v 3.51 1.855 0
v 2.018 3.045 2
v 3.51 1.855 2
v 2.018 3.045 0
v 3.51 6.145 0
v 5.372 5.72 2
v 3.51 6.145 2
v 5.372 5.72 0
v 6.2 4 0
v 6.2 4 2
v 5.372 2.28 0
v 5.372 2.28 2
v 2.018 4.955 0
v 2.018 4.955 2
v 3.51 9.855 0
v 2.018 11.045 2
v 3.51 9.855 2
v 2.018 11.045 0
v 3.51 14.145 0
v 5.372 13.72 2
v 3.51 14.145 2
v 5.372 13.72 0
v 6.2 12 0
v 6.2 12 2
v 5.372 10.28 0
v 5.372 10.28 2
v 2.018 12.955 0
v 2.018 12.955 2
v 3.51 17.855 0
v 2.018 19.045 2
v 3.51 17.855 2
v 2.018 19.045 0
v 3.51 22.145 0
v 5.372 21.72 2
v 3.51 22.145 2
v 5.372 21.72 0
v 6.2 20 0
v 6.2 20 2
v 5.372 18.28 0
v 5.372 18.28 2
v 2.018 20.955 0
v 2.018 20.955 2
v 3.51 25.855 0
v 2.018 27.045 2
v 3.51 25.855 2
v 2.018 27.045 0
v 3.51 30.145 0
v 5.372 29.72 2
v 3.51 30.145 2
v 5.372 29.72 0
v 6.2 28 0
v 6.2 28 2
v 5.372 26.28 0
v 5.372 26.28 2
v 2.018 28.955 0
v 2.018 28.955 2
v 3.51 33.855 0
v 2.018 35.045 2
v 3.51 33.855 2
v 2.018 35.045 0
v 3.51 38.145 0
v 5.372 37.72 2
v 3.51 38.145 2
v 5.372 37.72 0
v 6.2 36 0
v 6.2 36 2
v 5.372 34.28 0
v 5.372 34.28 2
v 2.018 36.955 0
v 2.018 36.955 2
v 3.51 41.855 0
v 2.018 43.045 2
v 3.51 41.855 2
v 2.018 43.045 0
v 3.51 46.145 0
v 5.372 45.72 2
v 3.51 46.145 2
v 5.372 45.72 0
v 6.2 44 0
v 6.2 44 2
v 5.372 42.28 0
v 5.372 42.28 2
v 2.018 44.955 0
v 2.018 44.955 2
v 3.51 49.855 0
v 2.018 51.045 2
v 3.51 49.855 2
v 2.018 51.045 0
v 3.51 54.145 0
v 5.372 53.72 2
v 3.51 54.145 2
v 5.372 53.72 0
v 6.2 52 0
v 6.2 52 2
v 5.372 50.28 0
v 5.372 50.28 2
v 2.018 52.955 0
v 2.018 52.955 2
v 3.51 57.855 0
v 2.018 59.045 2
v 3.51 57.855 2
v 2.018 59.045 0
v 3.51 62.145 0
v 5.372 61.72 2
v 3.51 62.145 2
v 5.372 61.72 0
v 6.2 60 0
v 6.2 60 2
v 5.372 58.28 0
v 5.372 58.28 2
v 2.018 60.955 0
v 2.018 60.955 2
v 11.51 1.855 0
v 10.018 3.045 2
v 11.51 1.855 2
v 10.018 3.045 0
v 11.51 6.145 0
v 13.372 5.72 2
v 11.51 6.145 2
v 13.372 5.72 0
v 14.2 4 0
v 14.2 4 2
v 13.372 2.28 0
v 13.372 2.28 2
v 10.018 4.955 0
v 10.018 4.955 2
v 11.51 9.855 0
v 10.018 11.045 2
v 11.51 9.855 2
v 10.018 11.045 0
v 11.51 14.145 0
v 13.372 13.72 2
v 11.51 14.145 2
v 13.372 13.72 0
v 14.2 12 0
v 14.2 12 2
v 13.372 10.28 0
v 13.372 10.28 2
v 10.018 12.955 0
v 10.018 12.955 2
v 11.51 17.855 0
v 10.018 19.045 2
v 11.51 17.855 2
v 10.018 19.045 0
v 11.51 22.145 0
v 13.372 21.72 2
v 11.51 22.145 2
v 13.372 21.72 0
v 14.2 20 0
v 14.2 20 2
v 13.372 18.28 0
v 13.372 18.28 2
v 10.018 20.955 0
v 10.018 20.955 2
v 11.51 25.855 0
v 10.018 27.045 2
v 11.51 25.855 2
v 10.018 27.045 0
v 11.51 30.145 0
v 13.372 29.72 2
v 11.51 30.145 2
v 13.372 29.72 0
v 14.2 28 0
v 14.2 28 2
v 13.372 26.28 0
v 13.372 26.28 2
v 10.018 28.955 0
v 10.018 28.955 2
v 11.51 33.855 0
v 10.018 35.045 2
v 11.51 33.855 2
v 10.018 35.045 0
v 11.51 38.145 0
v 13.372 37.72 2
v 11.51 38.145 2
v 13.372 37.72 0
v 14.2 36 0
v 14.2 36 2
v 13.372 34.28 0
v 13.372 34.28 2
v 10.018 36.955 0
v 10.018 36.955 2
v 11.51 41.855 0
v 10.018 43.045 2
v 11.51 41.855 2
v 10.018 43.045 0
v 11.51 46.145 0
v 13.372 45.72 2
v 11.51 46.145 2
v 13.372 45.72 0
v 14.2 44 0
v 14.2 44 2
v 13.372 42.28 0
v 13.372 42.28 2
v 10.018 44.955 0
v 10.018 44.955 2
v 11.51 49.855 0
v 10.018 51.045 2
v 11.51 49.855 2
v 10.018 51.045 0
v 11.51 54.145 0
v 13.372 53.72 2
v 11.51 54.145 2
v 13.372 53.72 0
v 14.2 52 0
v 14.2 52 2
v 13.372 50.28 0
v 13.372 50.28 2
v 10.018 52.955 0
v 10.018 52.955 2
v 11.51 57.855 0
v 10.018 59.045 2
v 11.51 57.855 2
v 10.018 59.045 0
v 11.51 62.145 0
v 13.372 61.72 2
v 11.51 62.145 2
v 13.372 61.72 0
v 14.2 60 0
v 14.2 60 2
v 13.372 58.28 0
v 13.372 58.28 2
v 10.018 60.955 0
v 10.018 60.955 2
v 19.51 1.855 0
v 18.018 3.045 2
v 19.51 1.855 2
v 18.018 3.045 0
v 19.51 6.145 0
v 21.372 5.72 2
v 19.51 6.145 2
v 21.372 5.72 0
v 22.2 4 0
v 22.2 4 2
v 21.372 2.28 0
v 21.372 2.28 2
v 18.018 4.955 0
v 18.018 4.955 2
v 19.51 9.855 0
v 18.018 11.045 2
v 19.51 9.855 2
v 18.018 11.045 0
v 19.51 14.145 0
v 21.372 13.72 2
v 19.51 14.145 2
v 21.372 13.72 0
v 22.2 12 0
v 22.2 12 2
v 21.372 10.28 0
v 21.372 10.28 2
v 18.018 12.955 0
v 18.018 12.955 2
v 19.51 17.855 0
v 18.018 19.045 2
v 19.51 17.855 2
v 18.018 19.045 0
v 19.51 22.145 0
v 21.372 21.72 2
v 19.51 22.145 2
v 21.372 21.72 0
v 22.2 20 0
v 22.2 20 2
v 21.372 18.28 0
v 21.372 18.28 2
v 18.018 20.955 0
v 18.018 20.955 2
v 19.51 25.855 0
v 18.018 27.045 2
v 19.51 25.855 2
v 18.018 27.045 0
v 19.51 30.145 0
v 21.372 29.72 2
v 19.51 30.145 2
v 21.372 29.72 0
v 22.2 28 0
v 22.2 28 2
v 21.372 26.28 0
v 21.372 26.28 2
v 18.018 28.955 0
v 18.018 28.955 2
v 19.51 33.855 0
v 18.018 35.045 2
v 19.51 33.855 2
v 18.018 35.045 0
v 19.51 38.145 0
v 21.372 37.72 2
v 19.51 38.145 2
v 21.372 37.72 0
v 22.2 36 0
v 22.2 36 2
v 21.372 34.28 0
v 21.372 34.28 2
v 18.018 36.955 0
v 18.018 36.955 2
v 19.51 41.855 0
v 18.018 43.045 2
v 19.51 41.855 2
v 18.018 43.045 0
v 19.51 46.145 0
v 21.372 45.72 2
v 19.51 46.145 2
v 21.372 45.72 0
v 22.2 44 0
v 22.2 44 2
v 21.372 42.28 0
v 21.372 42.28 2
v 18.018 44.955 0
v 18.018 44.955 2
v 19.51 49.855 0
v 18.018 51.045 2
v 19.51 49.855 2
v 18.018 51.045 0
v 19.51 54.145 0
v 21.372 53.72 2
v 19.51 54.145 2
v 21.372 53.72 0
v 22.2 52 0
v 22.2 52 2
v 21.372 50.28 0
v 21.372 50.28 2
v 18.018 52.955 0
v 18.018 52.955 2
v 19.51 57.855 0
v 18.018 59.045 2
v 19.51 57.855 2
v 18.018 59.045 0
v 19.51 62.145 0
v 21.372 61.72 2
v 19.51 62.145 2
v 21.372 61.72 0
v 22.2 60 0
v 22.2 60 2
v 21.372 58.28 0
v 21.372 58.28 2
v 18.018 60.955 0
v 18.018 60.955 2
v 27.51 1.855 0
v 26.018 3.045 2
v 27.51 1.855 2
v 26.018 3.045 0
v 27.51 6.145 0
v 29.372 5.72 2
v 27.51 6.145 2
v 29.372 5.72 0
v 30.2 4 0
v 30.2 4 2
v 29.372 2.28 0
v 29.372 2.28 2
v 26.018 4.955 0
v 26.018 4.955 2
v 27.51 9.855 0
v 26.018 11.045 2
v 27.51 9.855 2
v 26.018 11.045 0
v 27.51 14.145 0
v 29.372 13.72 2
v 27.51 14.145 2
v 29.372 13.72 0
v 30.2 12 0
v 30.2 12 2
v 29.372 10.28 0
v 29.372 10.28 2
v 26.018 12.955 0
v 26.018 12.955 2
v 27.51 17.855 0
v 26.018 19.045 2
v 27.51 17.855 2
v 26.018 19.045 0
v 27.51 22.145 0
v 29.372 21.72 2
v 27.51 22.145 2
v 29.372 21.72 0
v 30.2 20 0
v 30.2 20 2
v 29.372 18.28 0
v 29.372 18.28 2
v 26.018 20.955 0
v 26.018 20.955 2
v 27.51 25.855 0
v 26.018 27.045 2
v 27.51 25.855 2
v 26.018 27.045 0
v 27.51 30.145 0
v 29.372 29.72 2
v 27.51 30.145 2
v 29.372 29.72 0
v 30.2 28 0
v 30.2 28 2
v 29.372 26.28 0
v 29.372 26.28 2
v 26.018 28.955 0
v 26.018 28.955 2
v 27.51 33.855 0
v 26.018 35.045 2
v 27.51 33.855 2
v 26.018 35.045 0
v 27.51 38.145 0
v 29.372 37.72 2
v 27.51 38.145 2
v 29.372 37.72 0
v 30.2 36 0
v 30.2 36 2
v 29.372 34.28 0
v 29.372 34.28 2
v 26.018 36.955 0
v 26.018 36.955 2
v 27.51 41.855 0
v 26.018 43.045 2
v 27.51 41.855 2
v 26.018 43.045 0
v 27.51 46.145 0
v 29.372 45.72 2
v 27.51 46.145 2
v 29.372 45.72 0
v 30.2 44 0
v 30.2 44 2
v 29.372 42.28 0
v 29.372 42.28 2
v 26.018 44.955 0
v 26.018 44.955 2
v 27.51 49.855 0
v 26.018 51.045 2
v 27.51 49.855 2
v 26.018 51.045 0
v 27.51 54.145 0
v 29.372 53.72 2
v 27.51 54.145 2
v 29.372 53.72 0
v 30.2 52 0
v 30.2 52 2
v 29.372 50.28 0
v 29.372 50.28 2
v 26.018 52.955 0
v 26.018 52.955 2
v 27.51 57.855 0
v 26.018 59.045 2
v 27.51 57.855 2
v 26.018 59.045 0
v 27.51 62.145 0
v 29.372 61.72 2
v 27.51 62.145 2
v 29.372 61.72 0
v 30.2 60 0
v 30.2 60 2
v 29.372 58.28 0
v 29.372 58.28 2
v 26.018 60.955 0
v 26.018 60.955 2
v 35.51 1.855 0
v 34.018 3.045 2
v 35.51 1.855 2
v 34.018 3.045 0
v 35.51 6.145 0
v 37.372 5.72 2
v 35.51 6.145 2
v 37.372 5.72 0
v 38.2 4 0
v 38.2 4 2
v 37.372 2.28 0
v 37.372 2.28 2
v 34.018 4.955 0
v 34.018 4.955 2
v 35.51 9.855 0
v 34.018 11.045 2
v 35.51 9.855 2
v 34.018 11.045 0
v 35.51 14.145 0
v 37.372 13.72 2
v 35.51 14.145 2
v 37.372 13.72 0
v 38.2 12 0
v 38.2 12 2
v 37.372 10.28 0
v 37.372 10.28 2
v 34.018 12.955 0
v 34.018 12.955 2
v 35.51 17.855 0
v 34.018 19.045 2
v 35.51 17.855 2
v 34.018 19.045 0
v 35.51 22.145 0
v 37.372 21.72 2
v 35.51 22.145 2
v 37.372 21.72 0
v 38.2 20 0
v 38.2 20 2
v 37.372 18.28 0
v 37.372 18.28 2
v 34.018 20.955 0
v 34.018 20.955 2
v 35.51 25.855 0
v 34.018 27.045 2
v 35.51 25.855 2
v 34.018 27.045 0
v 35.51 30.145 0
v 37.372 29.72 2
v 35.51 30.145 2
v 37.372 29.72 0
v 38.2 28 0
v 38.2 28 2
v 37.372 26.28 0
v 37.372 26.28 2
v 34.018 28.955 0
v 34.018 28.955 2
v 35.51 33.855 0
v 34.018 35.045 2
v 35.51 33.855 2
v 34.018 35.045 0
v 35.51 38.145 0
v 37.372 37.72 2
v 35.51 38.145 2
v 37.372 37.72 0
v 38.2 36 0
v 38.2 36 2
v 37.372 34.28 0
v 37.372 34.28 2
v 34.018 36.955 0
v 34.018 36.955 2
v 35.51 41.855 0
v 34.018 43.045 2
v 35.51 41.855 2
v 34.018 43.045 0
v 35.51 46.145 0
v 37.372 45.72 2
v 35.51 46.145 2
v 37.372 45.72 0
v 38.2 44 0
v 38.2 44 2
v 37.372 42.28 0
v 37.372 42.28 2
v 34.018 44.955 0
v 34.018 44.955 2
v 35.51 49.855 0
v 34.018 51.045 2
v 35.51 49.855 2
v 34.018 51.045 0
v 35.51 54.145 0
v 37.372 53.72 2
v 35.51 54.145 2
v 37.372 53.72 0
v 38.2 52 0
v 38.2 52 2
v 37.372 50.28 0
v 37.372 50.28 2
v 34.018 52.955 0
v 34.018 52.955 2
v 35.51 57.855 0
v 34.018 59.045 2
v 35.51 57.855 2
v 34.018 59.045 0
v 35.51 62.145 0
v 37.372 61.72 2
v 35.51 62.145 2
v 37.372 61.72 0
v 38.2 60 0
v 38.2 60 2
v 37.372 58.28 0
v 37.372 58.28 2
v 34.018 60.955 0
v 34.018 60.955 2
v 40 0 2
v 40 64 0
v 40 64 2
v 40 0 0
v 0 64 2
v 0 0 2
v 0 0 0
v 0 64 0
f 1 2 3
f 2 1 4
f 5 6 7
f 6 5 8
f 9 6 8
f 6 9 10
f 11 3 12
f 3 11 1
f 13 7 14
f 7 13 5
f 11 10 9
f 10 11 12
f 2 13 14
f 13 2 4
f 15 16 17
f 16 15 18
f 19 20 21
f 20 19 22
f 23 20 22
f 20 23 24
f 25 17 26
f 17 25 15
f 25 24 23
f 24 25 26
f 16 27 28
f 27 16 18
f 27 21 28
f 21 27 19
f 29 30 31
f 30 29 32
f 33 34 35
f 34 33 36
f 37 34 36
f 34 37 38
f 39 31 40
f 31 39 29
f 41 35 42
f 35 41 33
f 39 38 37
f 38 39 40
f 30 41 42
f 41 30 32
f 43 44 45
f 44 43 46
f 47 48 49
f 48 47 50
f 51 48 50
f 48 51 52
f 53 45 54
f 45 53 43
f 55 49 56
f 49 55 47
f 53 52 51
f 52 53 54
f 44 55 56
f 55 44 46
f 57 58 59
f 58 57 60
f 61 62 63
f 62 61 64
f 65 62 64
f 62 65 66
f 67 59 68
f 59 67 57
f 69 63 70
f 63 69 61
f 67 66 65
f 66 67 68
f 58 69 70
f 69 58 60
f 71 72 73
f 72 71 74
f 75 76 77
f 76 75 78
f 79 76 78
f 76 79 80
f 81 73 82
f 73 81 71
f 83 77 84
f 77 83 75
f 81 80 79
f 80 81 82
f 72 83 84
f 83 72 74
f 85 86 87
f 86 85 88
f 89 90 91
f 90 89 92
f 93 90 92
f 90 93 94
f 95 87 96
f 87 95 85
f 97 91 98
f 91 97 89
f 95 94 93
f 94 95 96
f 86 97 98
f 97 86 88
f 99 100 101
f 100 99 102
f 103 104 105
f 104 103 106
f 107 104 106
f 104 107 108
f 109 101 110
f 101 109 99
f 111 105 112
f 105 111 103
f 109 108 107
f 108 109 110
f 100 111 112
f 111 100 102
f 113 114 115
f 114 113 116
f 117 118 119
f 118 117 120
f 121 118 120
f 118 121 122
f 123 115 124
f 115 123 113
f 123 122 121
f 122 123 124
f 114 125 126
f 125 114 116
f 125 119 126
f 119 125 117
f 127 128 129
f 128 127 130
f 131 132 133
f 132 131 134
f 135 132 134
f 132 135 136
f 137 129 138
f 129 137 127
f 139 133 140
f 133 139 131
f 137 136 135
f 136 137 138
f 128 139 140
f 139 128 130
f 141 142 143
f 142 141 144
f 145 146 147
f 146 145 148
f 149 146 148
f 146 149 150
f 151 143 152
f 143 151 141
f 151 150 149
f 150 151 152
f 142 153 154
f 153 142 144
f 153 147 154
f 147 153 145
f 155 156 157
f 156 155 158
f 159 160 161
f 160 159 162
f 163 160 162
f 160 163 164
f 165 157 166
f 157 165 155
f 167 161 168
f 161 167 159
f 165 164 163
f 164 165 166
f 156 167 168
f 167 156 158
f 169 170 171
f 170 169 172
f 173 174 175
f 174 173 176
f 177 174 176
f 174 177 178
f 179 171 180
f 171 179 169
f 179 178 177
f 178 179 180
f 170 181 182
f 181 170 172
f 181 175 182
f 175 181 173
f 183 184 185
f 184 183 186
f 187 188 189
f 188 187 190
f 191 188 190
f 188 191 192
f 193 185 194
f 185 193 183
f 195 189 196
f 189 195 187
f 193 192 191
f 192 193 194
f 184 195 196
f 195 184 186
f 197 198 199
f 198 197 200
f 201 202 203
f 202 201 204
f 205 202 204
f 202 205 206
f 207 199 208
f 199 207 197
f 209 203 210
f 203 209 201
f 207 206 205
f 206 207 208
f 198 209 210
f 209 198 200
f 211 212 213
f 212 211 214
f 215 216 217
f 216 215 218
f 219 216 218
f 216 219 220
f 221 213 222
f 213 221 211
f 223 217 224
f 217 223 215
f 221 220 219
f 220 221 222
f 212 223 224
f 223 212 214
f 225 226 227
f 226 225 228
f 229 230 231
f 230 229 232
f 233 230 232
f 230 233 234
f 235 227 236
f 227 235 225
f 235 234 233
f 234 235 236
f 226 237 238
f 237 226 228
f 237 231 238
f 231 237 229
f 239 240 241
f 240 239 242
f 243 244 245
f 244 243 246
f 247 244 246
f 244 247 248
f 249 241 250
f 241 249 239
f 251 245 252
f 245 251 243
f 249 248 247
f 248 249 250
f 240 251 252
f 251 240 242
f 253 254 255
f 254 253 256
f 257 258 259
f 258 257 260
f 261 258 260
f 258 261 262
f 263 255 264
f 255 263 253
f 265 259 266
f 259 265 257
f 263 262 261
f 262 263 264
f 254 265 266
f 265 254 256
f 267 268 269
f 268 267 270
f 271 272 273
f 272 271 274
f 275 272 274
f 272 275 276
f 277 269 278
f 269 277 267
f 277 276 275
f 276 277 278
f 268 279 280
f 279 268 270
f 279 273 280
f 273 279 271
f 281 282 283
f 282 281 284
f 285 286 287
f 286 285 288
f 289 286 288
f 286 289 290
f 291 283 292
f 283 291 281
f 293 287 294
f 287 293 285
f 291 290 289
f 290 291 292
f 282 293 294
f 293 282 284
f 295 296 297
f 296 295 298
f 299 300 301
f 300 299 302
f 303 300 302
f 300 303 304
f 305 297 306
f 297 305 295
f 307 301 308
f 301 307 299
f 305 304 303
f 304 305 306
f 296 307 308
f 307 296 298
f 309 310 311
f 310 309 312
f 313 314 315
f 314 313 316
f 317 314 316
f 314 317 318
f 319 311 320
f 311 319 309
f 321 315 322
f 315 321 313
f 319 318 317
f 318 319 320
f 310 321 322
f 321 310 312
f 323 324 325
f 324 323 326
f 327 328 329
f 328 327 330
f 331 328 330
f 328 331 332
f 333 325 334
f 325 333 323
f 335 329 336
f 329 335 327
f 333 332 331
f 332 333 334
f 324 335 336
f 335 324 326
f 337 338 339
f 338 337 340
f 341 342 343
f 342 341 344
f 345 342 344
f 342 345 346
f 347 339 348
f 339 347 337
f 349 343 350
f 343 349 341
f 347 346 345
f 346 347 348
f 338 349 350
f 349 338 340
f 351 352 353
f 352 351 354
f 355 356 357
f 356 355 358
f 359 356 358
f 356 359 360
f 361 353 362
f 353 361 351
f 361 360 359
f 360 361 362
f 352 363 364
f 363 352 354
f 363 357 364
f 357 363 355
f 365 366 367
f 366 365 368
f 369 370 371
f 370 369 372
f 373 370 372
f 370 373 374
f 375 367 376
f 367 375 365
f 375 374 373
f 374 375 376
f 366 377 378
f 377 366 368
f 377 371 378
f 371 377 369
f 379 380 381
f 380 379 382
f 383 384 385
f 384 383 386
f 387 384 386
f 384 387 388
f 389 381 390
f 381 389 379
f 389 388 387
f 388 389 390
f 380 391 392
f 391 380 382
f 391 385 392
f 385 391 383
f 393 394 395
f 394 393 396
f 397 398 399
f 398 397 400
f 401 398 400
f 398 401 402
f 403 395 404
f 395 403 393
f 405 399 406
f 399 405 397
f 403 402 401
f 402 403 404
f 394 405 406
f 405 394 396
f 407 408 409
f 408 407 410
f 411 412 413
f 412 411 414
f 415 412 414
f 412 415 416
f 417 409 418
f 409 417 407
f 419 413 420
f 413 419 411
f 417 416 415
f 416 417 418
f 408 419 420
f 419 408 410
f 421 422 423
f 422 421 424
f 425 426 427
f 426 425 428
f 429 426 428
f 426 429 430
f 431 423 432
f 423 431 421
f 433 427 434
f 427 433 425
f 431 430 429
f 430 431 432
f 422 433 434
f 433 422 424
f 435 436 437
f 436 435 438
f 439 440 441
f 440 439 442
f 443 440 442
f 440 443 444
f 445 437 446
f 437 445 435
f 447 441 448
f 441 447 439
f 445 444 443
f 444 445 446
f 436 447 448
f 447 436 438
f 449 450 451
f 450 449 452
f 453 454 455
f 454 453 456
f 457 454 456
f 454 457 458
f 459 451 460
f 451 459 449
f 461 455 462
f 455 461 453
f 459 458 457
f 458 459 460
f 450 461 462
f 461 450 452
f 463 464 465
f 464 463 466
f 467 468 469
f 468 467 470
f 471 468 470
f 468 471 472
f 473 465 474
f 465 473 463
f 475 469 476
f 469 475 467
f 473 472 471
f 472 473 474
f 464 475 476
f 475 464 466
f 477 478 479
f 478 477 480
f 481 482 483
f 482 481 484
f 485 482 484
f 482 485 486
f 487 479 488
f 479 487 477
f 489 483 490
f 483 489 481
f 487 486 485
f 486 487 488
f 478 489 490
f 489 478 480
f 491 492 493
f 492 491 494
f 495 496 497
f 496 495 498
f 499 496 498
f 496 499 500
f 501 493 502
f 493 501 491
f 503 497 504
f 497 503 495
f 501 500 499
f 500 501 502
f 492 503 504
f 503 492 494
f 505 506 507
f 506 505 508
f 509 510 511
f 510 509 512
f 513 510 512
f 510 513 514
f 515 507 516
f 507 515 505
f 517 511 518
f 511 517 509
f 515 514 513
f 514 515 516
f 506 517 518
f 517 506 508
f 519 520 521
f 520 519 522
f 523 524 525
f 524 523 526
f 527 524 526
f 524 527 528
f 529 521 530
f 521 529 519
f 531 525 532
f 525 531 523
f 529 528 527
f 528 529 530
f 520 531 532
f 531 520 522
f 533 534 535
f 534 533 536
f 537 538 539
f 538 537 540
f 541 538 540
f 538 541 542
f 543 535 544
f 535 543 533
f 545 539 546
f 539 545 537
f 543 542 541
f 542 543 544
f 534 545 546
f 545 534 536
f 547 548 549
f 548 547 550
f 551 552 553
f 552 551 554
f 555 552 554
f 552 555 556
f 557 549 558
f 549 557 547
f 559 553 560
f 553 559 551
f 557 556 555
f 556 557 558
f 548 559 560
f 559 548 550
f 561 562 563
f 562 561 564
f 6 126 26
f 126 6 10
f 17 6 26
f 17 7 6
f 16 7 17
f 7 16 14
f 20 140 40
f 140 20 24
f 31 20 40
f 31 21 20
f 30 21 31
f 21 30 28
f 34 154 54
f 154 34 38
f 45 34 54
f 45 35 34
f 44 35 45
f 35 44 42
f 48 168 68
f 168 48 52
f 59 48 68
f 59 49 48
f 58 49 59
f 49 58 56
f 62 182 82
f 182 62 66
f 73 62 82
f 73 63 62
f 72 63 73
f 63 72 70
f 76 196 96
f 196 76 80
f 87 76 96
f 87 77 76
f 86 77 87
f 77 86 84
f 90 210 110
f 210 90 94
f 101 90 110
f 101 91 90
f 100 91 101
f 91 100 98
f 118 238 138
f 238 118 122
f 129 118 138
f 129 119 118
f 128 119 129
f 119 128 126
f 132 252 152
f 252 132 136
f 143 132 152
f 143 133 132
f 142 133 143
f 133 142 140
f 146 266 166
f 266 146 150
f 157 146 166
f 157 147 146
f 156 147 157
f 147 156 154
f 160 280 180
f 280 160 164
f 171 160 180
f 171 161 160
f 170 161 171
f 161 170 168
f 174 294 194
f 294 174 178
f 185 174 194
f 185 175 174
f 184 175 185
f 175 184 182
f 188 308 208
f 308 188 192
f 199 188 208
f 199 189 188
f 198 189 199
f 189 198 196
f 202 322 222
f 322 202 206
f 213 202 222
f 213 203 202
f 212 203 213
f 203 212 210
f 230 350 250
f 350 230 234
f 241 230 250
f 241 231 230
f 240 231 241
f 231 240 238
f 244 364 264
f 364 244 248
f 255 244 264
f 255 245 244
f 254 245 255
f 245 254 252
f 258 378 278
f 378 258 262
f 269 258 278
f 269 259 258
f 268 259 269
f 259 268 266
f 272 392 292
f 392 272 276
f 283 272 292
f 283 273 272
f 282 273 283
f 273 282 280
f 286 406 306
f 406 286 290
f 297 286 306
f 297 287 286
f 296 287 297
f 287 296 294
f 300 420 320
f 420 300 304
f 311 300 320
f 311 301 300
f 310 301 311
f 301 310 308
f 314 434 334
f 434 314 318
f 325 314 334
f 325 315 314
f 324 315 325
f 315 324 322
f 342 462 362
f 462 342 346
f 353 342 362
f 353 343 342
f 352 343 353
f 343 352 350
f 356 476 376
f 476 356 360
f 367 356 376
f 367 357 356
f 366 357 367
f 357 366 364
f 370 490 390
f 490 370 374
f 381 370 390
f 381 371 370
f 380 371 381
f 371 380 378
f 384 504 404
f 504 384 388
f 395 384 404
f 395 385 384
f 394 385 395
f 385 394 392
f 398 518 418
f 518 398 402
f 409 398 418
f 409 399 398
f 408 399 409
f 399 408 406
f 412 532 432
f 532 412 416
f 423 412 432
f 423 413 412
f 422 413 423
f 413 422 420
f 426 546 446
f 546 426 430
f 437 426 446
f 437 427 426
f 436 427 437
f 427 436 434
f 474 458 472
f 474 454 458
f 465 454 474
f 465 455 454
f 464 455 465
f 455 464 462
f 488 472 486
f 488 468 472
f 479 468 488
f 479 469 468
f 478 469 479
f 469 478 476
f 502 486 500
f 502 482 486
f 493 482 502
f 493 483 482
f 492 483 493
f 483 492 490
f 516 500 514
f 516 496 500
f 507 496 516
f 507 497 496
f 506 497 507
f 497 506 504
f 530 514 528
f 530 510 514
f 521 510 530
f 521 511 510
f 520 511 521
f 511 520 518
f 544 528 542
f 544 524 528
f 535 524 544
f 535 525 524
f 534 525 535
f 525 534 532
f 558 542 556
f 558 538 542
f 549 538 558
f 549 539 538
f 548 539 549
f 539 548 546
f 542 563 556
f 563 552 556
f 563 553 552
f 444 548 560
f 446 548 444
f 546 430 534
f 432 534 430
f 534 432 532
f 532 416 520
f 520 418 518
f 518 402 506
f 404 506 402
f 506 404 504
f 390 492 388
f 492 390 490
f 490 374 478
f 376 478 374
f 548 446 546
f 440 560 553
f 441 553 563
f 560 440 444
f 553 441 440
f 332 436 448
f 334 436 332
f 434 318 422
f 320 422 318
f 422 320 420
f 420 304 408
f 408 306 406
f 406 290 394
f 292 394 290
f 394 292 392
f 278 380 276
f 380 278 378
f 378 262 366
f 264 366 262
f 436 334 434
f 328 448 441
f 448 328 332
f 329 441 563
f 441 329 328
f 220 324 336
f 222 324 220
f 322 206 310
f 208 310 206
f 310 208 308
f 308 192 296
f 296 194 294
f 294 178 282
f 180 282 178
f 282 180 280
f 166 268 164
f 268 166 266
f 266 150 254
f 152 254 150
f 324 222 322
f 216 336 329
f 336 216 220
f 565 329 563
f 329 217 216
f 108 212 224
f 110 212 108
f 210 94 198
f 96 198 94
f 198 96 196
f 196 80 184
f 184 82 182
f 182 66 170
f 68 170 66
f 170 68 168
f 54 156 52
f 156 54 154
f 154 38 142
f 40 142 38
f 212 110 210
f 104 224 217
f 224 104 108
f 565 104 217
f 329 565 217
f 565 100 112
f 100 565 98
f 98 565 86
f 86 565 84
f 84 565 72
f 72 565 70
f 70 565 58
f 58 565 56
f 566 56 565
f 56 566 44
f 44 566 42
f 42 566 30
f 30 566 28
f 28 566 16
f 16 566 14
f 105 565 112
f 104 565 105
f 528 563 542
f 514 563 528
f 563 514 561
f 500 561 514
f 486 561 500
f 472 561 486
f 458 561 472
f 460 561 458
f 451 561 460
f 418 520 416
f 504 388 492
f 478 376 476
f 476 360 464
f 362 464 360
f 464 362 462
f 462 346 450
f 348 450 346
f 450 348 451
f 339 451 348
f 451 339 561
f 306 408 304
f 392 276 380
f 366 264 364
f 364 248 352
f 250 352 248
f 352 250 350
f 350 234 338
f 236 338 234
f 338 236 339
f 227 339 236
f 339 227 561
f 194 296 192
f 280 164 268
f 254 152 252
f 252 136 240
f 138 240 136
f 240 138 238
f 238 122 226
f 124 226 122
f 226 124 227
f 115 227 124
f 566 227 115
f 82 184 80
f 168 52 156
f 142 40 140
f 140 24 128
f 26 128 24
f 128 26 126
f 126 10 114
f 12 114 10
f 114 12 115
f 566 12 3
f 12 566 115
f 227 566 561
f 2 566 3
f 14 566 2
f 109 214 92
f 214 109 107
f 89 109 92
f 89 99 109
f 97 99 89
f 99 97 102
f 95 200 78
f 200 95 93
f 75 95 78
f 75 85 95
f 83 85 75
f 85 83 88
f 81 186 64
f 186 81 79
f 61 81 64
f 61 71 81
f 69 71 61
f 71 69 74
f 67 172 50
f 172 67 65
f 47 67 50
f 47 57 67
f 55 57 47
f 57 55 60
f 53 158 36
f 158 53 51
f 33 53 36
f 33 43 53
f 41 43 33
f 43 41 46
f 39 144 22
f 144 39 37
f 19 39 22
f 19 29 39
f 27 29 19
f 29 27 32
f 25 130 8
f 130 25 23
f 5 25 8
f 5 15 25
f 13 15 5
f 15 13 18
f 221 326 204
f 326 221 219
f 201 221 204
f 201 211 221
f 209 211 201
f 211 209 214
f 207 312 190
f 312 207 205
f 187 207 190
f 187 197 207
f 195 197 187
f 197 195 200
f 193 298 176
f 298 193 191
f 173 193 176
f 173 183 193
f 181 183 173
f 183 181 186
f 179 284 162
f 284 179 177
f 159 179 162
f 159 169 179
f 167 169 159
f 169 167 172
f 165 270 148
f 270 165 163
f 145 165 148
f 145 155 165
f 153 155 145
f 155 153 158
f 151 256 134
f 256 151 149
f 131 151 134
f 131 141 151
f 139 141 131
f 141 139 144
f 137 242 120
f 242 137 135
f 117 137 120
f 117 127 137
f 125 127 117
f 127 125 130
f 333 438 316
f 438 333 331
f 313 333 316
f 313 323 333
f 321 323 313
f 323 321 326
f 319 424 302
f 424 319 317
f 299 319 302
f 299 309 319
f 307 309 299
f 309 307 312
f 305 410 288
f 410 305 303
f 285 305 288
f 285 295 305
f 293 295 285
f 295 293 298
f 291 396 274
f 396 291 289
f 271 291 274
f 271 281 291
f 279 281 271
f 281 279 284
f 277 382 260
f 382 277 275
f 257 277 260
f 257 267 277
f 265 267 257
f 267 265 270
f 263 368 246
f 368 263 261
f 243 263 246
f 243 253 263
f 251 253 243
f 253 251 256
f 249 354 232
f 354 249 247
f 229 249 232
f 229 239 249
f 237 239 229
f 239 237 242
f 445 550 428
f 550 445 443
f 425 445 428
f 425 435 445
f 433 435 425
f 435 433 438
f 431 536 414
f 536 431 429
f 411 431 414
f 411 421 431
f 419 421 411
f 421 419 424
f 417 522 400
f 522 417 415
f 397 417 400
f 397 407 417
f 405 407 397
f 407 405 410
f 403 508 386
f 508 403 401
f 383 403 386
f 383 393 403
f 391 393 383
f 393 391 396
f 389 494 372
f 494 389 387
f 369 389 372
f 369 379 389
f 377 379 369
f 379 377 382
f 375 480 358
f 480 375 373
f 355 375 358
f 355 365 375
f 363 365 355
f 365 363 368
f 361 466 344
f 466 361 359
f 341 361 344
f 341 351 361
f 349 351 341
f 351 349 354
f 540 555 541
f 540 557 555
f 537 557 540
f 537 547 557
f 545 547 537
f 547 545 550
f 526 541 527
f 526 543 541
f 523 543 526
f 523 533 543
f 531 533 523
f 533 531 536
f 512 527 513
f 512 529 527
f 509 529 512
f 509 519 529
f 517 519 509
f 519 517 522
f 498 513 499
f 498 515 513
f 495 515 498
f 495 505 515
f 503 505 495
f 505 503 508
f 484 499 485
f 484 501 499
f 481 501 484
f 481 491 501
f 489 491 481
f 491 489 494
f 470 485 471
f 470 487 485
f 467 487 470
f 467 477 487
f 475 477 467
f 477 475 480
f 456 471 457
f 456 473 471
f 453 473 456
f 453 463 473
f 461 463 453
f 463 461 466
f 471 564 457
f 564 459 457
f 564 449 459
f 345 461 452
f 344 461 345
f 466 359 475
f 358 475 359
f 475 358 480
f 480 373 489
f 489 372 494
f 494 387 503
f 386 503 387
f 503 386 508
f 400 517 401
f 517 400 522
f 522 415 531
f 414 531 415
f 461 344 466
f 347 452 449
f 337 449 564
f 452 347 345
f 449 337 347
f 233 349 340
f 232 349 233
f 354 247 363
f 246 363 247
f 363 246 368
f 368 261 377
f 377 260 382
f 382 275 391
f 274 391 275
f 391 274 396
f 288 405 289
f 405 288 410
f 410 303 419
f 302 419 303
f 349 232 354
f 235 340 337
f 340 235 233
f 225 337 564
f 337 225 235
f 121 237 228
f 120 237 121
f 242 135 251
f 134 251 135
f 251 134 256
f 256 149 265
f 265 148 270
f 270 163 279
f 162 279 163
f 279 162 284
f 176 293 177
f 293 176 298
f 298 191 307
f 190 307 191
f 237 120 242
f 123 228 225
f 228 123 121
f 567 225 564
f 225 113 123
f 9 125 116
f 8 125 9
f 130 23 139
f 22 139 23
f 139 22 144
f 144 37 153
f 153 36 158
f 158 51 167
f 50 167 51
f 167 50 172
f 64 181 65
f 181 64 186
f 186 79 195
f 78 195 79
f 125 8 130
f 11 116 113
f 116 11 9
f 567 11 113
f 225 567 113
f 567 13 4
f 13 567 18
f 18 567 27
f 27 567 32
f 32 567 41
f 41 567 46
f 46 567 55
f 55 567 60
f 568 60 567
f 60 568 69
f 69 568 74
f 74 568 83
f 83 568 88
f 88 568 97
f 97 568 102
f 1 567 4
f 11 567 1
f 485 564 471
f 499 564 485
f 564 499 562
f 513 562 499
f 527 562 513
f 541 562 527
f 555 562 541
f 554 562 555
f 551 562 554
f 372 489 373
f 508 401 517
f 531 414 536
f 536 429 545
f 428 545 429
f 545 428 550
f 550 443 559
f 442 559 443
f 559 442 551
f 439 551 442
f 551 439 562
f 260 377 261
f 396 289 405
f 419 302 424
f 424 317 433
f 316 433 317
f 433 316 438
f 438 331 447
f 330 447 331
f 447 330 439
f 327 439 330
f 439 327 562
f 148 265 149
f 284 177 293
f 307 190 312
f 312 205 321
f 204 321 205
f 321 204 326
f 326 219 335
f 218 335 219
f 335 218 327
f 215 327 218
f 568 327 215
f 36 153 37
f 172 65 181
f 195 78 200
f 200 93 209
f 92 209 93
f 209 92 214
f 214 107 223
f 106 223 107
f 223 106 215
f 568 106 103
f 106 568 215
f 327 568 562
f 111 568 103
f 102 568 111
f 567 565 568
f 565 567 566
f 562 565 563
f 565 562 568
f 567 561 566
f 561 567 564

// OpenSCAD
// configuration
width = 5;          // in holes
height = 8;         // in holes
thickness = 2;      // in mm
hole = 4;           // diameter in mm
space = 4;          // inter-hole space in mm
pad = space / 2;    // in mm

// pre-computation
w = width*hole + (width-1)*space + 2*pad;
h = height*hole + (height-1)*space + 2*pad;

difference() {
    cube([w, h, thickness]);
    for(i=[1:width]) {
        for(j=[1:height]) {
            translate([
                i*hole + (i - 1)*space - hole/2 + pad,
                j*hole + (j - 1)*space - hole/2 + pad,
                -thickness
            ]) {
                cylinder(h=3 * thickness, r=hole/2 + 0.2);
            }
        }
    }
};
